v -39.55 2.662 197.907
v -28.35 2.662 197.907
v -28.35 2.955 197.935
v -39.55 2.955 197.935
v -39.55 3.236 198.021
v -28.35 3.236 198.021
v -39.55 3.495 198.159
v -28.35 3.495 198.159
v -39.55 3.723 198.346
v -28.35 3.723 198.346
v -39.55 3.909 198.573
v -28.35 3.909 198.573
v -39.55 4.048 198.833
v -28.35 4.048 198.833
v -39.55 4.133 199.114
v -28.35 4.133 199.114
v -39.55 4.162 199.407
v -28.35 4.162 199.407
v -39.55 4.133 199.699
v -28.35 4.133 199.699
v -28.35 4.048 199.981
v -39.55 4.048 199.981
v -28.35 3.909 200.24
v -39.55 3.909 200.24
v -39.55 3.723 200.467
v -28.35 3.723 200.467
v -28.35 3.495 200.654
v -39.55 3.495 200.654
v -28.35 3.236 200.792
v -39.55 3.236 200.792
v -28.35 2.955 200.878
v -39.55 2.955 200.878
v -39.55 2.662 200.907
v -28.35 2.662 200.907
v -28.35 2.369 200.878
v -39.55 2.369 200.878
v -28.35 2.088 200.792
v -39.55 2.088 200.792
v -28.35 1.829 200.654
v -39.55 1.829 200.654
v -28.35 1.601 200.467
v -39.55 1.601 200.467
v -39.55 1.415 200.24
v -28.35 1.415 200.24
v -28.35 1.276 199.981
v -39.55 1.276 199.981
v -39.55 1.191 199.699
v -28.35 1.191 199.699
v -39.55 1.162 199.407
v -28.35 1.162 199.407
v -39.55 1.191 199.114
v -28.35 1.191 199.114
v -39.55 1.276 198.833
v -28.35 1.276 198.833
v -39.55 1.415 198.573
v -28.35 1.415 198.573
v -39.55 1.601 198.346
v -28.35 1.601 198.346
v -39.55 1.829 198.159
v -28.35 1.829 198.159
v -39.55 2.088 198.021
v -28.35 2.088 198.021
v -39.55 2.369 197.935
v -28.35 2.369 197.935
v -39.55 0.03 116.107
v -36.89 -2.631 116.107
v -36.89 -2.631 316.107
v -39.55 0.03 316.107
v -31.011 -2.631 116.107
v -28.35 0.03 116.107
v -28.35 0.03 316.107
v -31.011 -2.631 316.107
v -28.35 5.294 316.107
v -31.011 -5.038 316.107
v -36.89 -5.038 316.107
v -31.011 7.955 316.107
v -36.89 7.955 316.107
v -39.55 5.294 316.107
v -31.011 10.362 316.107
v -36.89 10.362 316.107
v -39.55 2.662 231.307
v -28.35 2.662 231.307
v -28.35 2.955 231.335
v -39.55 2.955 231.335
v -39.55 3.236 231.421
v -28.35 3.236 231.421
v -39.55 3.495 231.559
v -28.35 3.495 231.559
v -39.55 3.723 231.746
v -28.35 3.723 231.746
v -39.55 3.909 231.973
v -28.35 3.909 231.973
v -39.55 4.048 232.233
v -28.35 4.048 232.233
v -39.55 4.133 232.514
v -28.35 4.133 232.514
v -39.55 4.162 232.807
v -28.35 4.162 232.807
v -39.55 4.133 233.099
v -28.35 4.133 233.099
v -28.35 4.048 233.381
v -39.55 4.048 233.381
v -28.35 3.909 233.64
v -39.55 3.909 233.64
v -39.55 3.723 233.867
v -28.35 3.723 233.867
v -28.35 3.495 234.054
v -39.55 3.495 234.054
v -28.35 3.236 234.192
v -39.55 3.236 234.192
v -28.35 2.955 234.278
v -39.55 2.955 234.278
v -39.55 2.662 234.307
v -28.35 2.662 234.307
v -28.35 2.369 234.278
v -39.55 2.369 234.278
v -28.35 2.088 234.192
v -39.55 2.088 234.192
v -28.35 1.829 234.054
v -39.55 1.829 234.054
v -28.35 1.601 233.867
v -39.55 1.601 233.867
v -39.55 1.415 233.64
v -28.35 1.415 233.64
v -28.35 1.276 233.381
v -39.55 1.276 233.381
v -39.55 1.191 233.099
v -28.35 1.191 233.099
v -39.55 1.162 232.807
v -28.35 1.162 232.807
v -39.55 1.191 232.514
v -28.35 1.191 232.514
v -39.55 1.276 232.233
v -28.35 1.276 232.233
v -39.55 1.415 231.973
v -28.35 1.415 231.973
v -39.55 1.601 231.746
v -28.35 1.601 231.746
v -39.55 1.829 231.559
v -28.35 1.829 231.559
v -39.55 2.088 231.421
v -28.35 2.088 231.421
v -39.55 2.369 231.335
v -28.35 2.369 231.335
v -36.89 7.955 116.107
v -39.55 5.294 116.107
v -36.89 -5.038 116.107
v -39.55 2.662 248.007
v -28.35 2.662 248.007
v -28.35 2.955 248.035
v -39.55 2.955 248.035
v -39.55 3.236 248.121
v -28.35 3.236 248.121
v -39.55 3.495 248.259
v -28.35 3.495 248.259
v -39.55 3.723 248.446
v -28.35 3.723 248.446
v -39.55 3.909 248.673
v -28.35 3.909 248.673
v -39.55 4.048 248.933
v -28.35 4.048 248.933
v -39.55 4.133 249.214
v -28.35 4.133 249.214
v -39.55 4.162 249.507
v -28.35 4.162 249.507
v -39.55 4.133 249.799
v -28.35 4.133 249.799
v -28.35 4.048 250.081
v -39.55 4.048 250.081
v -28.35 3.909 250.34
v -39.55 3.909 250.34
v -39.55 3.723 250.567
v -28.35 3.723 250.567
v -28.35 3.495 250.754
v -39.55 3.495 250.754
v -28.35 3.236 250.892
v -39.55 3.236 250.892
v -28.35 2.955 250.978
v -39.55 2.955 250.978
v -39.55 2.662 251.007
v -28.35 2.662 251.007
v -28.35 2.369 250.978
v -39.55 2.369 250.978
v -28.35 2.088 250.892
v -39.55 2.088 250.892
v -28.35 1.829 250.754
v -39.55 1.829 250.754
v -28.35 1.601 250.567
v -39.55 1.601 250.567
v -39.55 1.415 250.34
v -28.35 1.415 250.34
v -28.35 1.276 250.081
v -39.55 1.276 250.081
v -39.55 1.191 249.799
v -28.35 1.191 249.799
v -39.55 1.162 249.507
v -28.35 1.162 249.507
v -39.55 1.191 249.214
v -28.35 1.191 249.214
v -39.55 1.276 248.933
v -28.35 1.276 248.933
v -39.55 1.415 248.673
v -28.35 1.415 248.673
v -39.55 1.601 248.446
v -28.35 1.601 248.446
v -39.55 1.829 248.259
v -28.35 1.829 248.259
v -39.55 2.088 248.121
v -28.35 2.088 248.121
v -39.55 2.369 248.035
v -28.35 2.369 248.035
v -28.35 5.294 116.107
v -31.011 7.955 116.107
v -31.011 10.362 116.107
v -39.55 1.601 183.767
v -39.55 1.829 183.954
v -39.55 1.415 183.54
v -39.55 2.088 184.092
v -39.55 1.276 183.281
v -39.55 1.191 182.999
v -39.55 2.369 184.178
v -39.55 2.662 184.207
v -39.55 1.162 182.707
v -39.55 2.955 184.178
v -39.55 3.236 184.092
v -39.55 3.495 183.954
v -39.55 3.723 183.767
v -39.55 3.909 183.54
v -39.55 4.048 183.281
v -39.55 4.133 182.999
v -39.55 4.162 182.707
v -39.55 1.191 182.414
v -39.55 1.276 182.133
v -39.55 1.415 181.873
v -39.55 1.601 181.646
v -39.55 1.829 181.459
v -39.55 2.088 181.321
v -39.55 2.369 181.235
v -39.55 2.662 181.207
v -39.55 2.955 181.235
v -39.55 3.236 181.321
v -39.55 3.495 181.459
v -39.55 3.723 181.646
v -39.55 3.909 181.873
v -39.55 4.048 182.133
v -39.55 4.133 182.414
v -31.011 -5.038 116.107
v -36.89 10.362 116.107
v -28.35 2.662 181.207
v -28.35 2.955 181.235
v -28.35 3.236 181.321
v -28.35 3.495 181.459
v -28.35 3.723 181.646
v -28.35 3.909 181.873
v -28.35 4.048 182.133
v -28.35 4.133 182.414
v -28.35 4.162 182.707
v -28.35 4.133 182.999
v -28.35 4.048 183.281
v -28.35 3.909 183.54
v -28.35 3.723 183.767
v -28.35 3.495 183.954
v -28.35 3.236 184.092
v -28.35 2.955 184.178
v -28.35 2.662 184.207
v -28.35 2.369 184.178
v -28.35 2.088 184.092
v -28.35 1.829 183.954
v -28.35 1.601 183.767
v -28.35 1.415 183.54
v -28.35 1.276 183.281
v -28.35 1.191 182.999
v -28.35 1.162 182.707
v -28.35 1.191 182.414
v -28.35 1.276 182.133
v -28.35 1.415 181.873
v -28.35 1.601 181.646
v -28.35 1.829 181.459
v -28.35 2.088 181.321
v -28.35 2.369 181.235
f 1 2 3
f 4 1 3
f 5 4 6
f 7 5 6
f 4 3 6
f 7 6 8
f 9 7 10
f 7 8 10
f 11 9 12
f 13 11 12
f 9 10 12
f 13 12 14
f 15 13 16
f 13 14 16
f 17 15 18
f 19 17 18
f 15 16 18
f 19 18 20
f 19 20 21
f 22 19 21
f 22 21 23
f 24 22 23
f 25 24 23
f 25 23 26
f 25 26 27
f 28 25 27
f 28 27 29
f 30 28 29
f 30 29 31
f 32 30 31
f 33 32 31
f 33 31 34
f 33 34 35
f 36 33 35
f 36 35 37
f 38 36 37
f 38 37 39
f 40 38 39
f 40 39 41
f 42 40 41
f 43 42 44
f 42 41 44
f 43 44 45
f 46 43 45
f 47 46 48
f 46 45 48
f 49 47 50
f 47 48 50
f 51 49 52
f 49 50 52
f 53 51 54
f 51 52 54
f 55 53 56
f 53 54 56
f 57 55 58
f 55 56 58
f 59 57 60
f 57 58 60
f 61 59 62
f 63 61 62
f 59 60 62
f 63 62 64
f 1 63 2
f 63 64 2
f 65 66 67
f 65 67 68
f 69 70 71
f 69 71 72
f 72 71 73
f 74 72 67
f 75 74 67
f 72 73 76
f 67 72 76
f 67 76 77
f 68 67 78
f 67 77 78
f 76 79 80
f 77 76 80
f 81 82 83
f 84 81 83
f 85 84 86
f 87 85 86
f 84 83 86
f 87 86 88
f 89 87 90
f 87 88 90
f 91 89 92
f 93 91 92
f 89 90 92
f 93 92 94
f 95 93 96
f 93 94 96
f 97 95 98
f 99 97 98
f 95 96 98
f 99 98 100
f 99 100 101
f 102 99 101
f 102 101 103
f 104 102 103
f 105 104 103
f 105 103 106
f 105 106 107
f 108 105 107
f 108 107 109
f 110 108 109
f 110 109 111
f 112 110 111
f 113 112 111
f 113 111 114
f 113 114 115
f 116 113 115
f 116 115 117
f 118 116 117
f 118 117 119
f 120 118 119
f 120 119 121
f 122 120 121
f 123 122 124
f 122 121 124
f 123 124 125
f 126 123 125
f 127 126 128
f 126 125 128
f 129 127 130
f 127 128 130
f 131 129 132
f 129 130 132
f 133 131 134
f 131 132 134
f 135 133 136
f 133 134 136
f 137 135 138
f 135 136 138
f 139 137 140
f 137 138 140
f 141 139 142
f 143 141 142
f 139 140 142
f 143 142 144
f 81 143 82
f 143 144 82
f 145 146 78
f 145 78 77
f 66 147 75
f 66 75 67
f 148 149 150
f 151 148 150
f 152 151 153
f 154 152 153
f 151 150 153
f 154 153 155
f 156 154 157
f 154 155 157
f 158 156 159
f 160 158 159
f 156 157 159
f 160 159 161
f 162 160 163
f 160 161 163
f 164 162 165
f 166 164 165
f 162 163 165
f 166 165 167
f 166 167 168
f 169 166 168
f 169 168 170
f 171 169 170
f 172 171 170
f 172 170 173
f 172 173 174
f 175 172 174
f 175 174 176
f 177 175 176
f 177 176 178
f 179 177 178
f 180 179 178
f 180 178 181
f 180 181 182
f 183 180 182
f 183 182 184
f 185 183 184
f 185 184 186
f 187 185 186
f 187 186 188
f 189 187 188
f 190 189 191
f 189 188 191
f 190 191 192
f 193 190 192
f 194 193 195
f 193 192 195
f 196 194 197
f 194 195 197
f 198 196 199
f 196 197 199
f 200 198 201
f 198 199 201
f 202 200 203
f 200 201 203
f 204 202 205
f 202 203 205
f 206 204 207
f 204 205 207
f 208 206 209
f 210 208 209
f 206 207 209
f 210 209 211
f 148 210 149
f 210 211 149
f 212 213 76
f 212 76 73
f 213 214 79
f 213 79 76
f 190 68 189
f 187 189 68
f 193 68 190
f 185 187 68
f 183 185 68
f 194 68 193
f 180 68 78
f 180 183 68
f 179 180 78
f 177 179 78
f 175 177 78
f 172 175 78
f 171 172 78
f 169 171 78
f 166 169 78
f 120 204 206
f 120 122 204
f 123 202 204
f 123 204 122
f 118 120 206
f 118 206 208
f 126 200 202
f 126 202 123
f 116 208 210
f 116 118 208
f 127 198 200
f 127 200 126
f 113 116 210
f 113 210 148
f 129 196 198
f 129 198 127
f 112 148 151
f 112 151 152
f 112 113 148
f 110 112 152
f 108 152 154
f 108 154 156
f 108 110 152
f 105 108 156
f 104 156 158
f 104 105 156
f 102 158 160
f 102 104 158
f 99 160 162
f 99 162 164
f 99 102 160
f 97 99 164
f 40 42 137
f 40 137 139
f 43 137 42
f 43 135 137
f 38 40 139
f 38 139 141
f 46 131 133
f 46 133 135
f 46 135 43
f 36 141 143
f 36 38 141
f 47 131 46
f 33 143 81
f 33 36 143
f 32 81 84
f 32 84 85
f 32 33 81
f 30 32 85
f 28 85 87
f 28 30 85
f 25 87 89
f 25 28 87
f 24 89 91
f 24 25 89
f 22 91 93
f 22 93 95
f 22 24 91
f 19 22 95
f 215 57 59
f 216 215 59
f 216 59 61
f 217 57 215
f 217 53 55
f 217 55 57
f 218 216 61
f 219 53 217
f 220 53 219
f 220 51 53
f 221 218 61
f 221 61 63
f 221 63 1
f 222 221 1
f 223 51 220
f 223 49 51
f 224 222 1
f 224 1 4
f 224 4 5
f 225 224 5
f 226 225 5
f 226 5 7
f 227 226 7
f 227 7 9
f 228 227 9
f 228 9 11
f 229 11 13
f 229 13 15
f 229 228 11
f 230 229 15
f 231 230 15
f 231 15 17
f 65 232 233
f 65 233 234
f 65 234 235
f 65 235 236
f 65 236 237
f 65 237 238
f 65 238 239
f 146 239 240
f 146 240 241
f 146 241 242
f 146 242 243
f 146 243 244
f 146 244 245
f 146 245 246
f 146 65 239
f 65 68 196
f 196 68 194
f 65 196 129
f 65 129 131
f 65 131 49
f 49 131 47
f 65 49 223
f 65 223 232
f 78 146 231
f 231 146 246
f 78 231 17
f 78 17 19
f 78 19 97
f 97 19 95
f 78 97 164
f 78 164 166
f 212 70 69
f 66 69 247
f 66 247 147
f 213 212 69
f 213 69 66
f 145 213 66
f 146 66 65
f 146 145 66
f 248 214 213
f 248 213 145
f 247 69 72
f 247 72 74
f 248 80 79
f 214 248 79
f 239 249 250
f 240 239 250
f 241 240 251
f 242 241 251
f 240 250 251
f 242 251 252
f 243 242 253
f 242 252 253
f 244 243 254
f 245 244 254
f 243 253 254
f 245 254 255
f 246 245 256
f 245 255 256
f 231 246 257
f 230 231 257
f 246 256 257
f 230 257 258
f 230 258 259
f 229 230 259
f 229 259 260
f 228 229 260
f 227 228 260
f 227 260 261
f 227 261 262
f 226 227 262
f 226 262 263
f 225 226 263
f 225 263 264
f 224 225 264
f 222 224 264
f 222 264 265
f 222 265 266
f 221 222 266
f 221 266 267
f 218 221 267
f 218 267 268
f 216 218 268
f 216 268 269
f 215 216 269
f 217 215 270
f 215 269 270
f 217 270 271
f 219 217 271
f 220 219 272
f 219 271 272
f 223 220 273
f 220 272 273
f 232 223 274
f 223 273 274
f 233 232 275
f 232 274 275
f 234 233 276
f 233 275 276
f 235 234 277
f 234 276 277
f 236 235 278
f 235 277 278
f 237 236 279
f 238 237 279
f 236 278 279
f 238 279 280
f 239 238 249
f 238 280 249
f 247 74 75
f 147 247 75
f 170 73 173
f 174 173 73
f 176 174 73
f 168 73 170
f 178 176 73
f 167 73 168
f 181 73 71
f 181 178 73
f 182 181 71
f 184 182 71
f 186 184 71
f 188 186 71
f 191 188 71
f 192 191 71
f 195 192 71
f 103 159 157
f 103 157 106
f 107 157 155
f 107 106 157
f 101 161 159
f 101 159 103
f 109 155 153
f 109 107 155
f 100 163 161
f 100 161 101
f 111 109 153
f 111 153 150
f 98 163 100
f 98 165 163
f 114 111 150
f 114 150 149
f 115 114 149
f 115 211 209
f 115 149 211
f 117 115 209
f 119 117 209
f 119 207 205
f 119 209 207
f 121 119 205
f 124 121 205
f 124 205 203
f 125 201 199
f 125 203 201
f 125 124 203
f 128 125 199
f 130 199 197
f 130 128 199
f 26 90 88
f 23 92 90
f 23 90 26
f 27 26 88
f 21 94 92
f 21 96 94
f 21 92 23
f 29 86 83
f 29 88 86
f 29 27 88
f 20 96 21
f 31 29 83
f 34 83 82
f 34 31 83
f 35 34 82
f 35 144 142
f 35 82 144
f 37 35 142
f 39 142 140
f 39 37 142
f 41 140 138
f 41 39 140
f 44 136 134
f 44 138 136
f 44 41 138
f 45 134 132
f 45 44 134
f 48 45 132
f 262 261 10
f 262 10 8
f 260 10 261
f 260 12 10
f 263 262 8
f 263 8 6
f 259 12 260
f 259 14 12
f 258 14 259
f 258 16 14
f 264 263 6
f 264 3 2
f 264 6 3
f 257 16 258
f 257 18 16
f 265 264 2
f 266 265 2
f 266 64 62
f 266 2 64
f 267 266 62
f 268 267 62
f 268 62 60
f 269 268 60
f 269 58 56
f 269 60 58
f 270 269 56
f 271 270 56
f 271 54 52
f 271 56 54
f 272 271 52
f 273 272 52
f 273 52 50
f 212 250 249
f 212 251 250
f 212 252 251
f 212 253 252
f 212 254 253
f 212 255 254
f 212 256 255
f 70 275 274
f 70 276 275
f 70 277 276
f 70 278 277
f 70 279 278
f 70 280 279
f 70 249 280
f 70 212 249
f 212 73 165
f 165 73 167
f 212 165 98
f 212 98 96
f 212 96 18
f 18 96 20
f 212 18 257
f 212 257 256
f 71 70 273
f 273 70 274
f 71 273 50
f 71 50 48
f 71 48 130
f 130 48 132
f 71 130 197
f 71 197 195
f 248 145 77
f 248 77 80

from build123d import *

# Parameters (mm, degrees)
BOSS_EXTRUDE1_DEPTH = 200
SKETCH2_R           = 1.5
CUT_EXTRUDE1_DEPTH  = 20


with BuildPart() as part:
    # Sketch1 → Boss-Extrude1 (new body)
    with BuildSketch(Plane.XY.offset(116.106580091)):
        Polygon((-39.550290087, 5.294235639), (-36.889629915, 7.954895811), (-36.889629915, 10.362002592), (-31.010950259, 10.362002592), (-31.010950259, 7.954895811), (-28.350290087, 5.294235639), (-28.350290087, 0.029769545), (-31.010950259, -2.630890626), (-31.010950259, -5.037997408), (-36.889629915, -5.037997408), (-36.889629915, -2.630890626), (-39.550290087, 0.029769545), align=None)
    extrude(amount=BOSS_EXTRUDE1_DEPTH)

    # Sketch2 → Cut-Extrude1 (cut)
    with BuildSketch(Plane(origin=(-28.350290087, 0, 0), x_dir=(0, 0, -1), z_dir=(1, 0, 0))):
        with Locations((-232.806580091, 2.662002592)):
            Circle(SKETCH2_R)
        with Locations((-249.506580091, 2.662002592)):
            Circle(SKETCH2_R)
        with Locations((-199.406580091, 2.662002592)):
            Circle(SKETCH2_R)
        with Locations((-182.706580091, 2.662002592)):
            Circle(SKETCH2_R)
    extrude(amount=-CUT_EXTRUDE1_DEPTH, mode=Mode.SUBTRACT)


solid = part.part
